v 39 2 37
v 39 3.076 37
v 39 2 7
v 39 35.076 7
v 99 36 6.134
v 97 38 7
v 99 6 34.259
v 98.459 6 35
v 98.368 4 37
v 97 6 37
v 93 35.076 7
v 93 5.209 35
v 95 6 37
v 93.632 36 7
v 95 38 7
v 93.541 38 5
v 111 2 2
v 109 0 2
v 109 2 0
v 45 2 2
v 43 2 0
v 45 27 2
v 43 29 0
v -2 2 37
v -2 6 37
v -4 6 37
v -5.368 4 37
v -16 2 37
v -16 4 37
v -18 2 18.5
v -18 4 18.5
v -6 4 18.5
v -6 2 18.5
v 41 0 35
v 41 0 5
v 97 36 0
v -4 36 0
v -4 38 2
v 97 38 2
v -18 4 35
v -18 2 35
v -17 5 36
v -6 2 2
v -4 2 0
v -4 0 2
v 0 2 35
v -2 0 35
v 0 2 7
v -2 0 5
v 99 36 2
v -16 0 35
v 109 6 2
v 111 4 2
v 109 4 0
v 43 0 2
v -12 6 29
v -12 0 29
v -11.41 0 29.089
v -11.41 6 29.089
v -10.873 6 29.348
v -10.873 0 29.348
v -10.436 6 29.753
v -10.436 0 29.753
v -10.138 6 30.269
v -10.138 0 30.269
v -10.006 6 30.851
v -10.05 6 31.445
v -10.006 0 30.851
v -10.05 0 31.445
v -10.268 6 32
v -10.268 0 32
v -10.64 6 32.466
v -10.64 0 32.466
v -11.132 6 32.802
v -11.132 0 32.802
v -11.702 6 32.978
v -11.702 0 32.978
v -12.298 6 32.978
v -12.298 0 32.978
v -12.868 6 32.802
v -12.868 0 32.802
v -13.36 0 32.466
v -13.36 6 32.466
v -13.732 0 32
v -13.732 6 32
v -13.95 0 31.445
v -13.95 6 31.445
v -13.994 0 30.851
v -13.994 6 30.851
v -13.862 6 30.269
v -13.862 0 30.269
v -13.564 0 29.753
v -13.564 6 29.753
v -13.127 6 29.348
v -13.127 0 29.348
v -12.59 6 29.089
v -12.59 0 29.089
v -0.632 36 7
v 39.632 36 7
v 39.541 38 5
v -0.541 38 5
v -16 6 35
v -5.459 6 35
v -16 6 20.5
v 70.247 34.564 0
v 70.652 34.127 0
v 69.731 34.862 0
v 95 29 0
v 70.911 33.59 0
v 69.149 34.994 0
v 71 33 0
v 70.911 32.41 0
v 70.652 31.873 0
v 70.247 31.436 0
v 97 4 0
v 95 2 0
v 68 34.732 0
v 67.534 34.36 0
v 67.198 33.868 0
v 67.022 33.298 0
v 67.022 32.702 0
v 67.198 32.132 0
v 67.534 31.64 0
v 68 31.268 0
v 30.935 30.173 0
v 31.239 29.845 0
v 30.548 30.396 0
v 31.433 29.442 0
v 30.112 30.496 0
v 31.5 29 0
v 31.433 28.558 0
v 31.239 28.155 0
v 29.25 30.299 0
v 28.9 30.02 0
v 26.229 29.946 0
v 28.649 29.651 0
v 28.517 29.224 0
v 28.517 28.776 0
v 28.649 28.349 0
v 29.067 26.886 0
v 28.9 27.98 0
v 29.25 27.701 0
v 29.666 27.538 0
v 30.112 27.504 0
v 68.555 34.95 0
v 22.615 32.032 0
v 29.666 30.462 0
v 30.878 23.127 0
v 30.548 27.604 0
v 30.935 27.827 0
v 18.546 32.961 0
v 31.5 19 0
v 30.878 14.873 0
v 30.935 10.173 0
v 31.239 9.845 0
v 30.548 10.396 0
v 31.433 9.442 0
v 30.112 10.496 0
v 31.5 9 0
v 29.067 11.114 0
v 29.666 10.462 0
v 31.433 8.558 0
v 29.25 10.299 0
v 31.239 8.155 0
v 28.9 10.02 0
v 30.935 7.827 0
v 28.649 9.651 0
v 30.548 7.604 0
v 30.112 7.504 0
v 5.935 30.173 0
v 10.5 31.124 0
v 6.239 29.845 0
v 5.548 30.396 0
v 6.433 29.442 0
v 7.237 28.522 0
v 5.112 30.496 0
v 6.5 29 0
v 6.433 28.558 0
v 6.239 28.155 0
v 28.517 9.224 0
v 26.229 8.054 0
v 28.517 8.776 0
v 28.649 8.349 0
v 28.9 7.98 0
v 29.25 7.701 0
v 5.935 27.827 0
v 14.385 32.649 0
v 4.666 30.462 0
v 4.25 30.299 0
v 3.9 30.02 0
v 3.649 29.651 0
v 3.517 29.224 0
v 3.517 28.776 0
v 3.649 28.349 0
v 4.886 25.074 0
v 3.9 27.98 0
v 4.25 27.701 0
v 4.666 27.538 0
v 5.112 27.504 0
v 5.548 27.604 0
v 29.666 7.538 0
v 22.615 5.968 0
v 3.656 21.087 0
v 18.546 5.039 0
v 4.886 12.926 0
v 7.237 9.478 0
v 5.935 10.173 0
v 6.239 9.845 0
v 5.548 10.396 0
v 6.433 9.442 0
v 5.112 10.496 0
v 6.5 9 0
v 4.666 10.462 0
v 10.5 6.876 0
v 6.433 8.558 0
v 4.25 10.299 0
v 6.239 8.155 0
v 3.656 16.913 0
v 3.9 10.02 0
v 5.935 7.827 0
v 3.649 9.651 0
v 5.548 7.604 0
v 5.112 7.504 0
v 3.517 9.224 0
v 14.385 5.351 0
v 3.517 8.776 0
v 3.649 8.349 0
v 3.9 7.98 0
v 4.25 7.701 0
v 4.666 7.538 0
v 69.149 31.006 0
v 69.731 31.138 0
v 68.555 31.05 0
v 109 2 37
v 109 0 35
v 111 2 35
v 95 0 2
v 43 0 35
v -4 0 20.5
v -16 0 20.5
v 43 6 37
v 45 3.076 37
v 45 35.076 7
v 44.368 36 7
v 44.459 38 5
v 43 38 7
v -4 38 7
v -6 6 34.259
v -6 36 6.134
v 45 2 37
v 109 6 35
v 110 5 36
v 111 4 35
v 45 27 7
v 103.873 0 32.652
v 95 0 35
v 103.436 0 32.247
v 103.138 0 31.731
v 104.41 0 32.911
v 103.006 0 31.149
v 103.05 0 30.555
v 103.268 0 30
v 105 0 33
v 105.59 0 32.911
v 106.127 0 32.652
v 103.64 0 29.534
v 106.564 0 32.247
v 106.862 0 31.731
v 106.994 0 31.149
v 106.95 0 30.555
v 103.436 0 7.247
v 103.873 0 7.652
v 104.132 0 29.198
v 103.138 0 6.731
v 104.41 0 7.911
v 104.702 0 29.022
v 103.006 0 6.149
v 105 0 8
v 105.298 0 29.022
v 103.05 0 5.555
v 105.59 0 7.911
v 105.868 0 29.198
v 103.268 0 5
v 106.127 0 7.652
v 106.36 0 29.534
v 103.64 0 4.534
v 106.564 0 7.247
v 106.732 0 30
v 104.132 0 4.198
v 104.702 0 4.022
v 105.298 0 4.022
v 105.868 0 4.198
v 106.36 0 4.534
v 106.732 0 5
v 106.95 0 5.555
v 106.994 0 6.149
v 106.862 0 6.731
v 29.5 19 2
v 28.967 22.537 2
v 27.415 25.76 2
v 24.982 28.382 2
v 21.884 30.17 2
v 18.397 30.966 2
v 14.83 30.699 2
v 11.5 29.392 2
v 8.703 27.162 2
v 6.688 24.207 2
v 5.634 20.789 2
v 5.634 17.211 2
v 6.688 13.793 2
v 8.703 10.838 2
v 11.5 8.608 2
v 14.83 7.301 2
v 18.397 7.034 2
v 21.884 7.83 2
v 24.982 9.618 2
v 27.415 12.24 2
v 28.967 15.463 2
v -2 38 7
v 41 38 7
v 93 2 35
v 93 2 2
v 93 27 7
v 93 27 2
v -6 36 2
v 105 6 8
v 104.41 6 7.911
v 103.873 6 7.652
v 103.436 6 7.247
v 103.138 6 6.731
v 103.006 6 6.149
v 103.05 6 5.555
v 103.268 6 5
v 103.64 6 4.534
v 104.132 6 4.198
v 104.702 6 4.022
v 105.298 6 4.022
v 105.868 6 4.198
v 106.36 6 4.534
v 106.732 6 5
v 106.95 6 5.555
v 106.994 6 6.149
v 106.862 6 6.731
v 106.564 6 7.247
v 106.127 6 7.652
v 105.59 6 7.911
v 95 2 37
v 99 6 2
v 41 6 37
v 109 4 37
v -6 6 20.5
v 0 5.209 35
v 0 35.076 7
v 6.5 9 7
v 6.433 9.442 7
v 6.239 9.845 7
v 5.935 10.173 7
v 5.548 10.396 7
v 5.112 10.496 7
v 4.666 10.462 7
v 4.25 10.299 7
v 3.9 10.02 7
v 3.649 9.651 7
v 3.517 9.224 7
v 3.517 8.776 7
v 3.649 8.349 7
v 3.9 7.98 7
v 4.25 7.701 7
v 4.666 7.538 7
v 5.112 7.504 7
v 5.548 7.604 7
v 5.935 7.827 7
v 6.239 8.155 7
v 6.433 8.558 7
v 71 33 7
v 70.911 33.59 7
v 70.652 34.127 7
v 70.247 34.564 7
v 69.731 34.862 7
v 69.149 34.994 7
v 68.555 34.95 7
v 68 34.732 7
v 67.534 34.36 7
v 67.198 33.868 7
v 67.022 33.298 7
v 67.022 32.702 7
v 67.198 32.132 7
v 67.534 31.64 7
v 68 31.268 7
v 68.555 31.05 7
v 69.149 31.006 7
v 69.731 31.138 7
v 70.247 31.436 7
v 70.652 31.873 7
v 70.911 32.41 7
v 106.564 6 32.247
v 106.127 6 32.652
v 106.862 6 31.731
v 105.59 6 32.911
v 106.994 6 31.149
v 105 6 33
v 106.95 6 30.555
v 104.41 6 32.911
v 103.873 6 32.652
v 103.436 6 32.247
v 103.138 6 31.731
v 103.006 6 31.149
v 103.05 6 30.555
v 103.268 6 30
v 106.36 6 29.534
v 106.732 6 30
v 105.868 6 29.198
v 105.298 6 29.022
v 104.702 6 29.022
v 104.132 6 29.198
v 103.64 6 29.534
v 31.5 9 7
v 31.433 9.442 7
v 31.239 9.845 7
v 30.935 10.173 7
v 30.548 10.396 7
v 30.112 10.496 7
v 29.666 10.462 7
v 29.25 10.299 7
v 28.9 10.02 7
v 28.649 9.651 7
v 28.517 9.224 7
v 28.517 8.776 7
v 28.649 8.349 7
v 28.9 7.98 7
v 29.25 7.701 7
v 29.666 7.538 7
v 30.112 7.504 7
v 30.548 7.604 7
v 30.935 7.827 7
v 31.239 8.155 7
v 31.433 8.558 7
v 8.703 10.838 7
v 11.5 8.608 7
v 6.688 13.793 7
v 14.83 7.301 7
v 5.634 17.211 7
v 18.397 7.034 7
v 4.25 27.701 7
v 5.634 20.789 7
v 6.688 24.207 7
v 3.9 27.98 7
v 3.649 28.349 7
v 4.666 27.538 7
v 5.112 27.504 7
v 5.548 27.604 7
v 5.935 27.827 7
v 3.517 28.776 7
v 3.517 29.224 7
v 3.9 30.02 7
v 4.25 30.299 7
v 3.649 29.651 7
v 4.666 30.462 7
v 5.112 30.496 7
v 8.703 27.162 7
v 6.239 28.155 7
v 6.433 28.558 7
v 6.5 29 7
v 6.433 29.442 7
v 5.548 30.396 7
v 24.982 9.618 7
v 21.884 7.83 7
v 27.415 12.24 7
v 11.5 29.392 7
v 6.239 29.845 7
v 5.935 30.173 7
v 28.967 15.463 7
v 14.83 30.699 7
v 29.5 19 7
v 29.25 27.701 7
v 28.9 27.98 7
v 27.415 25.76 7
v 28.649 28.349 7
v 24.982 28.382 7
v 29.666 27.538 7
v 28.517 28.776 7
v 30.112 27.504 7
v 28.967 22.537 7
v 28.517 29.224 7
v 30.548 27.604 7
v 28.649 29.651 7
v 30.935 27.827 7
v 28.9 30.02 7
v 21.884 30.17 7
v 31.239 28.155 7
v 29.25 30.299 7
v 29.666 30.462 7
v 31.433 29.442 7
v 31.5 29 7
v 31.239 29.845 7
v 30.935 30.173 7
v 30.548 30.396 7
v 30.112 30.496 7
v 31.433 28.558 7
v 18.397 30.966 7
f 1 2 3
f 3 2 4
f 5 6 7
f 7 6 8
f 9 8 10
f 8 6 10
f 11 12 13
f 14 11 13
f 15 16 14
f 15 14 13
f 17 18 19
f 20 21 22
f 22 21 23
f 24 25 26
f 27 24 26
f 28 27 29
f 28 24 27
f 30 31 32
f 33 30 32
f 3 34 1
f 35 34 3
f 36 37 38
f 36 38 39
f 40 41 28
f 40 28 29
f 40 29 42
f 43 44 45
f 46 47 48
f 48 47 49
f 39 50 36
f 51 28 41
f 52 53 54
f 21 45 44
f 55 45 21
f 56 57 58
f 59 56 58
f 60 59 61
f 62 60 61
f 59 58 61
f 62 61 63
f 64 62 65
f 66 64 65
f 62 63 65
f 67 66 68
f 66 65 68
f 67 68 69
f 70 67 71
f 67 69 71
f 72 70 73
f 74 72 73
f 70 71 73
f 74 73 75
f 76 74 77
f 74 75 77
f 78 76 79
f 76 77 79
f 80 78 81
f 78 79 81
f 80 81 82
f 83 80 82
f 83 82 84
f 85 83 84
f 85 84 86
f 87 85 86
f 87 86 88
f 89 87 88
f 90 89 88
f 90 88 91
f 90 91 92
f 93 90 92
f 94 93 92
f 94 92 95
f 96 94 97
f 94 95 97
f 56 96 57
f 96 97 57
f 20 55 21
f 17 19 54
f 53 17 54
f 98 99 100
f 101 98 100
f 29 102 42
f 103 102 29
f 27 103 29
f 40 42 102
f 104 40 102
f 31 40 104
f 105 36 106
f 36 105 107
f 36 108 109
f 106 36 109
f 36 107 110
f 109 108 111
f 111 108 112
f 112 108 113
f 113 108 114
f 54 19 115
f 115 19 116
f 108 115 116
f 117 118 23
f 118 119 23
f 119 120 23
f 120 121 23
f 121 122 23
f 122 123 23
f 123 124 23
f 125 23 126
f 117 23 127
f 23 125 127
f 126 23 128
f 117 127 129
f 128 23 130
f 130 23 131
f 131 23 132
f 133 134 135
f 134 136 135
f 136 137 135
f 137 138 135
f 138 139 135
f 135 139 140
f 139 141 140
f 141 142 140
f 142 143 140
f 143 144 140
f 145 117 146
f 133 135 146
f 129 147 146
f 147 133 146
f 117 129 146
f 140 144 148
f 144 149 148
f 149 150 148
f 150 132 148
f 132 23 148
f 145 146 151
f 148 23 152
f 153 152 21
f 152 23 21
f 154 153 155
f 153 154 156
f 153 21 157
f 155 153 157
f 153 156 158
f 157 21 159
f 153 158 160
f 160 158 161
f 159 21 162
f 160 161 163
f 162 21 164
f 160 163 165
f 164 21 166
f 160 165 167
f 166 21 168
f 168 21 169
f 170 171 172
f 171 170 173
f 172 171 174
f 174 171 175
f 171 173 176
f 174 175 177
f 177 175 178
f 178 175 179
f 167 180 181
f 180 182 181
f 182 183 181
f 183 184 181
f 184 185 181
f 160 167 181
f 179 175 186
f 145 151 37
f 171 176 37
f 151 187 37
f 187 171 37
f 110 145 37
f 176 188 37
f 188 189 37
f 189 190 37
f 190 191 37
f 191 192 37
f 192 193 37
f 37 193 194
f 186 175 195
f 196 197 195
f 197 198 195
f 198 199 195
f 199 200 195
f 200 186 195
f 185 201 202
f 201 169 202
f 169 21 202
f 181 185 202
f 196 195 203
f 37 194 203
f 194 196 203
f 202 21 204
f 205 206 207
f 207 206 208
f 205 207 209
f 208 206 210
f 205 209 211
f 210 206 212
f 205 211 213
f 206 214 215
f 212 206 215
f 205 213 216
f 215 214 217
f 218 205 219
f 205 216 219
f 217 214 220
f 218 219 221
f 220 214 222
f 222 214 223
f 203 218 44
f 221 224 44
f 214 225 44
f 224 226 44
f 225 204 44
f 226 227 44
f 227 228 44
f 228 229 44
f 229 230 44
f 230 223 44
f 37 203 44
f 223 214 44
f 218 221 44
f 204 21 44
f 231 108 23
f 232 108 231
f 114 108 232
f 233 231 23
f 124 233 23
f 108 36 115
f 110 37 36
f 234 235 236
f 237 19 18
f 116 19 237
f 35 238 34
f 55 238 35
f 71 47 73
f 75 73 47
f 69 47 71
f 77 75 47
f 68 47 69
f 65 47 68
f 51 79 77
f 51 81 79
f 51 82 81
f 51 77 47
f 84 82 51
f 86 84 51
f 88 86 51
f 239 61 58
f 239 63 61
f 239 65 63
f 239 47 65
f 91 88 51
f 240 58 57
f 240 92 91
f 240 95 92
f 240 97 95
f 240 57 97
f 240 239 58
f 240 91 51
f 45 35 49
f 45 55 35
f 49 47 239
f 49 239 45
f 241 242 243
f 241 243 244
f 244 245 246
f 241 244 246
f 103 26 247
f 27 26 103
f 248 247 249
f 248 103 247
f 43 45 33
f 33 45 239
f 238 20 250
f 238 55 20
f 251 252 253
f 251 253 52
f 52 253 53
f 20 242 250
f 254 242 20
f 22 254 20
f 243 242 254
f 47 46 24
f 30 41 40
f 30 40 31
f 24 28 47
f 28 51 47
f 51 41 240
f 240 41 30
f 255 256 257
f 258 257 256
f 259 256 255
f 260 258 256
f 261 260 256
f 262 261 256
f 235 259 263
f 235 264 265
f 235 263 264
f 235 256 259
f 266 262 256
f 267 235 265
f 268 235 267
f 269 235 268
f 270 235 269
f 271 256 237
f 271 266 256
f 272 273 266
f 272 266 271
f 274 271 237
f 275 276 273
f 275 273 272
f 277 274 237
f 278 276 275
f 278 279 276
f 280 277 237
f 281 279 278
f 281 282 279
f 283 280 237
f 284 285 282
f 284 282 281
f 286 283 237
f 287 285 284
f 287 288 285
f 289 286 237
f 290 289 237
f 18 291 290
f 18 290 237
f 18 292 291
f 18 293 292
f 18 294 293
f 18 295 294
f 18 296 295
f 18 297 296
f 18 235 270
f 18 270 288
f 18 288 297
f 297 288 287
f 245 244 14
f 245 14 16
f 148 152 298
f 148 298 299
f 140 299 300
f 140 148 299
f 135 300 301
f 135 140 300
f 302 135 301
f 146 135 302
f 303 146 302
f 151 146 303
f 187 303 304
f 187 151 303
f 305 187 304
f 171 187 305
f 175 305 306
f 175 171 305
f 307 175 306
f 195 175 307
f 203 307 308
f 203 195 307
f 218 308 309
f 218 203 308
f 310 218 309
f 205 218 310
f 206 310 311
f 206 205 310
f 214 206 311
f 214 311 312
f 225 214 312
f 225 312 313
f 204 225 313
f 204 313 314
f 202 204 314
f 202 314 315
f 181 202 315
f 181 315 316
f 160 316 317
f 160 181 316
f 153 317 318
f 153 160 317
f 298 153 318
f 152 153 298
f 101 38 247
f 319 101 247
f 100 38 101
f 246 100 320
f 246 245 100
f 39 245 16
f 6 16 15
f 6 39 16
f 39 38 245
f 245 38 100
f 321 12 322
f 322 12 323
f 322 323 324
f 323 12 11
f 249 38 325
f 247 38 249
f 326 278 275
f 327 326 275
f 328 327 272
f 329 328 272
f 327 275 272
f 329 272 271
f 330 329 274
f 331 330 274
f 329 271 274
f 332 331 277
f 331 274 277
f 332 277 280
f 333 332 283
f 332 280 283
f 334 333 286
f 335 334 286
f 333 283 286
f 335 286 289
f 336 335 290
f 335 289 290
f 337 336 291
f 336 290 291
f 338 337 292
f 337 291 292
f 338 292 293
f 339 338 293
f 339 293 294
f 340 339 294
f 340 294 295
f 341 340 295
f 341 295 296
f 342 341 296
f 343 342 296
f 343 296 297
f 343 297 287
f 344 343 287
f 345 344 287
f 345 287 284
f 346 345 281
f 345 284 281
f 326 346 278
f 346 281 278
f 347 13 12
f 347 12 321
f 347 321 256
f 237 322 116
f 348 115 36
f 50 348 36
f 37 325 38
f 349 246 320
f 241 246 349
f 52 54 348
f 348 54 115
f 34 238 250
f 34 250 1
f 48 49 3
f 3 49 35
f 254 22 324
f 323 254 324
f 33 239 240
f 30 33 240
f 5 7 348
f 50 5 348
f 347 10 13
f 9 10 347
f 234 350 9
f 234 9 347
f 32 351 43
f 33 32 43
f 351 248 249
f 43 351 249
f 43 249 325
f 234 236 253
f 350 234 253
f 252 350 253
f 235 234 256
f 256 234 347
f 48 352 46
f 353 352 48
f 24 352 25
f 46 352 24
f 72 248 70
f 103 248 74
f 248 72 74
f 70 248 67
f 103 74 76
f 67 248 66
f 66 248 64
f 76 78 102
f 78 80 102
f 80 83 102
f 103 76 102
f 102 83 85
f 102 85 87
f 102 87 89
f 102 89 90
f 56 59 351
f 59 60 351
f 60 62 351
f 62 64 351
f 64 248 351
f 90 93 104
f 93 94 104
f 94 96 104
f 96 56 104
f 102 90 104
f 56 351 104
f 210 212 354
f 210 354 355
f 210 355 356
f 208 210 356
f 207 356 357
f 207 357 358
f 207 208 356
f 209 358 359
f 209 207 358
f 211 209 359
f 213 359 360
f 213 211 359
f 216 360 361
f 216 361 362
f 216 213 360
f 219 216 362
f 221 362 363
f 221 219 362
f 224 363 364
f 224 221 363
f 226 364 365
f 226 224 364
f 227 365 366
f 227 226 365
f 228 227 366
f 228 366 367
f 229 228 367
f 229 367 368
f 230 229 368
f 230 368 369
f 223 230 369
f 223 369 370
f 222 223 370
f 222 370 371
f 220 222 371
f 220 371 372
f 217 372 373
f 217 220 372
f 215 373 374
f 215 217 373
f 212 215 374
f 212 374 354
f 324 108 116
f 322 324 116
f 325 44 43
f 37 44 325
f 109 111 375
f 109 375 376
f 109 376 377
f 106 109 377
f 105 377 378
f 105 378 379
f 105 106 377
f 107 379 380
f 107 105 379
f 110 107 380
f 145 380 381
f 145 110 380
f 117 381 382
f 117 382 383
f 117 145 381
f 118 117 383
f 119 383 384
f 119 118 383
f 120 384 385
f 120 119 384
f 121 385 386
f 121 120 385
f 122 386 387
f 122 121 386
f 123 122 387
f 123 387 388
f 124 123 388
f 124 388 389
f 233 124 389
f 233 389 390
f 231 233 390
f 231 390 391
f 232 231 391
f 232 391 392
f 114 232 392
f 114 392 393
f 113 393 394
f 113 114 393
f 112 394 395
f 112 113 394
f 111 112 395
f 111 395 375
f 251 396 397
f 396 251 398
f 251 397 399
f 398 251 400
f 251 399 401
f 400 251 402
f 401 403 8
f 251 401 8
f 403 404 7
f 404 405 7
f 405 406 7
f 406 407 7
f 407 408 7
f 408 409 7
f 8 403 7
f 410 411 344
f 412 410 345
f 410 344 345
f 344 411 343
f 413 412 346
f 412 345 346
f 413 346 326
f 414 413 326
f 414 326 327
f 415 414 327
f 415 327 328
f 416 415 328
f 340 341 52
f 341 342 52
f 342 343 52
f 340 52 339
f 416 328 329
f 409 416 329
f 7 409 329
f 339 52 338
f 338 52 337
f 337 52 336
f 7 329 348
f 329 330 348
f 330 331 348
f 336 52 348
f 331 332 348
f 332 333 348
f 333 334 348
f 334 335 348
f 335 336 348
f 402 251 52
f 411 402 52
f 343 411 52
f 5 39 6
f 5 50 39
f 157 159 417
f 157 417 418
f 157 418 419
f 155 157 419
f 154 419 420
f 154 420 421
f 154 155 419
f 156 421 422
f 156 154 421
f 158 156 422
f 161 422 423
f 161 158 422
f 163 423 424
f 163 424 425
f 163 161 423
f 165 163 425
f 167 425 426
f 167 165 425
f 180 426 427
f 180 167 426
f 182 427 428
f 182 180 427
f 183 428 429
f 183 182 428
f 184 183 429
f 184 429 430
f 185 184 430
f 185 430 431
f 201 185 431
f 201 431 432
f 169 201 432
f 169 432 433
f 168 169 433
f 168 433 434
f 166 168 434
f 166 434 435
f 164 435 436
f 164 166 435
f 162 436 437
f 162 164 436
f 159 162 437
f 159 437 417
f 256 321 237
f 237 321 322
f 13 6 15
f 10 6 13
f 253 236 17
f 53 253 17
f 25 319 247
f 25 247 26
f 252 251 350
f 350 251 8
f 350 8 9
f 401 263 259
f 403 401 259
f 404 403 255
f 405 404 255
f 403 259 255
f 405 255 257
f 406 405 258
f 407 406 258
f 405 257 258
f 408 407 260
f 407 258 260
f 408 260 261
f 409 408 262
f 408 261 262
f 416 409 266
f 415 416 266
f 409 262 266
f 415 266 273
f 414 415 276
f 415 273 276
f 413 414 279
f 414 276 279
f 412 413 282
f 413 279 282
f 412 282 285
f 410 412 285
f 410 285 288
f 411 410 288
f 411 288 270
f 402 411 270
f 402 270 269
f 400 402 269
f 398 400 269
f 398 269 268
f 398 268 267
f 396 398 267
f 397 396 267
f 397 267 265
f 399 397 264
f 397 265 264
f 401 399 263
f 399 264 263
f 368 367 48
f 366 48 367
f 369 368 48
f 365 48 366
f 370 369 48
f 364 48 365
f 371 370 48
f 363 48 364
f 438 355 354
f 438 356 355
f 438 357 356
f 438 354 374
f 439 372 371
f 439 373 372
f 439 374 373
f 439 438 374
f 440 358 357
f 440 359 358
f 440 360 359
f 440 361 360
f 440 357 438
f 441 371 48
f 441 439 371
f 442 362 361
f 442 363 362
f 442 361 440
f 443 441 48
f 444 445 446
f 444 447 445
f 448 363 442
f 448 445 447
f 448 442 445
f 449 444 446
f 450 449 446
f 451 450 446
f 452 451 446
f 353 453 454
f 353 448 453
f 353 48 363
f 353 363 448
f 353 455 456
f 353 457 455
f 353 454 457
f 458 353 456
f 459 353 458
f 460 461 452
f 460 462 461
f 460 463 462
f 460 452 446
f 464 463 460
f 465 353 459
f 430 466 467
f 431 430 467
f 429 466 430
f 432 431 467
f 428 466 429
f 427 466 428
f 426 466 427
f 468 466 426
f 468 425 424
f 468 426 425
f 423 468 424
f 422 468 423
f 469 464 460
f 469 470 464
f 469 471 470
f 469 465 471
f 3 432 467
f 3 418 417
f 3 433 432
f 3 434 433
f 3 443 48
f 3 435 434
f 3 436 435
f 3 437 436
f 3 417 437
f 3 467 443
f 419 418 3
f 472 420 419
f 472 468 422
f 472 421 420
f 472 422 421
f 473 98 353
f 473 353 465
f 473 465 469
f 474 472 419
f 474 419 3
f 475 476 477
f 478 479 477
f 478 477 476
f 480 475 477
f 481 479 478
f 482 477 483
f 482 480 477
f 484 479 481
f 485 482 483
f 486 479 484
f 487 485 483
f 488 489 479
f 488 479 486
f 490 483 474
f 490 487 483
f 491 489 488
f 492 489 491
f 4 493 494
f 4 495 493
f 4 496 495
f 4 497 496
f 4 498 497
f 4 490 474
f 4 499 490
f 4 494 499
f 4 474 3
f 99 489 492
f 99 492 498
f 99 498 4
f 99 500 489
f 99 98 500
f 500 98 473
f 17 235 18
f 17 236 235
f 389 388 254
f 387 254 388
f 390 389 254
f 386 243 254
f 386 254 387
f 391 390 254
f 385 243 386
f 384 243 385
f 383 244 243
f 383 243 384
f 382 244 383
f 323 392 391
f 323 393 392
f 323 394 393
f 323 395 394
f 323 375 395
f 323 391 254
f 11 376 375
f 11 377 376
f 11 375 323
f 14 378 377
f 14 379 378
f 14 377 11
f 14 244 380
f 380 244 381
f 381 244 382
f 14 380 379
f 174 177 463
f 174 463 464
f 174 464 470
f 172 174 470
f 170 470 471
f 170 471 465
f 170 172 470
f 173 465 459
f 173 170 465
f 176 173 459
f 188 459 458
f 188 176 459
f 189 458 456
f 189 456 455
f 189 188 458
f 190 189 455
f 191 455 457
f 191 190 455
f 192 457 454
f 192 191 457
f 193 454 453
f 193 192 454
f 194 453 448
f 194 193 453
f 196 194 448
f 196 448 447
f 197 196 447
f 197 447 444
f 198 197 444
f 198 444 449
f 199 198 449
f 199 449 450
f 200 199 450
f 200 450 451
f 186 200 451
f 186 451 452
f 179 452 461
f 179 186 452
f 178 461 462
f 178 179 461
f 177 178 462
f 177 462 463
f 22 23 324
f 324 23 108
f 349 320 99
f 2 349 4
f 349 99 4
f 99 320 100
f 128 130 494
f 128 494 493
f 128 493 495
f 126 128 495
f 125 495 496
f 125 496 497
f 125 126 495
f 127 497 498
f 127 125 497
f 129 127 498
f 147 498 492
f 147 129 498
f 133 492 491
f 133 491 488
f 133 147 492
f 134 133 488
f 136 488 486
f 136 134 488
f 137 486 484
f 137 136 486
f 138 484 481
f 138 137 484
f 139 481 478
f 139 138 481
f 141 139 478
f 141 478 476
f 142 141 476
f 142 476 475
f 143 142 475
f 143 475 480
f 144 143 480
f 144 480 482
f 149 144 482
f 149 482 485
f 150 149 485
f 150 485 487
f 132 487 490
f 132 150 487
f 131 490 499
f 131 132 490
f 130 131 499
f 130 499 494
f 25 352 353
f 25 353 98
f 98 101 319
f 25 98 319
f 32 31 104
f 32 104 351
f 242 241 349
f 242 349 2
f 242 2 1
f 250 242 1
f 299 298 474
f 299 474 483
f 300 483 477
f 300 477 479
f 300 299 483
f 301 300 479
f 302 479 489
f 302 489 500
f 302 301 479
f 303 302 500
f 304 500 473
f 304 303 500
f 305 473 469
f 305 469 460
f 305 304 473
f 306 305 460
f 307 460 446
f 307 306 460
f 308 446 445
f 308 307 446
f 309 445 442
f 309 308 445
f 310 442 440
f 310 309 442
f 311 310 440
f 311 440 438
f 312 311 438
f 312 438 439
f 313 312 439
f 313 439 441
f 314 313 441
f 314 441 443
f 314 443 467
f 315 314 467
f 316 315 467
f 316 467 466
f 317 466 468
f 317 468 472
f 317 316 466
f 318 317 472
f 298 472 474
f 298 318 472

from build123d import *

# Parameters (mm, degrees)
SKETCH1_R           = 12
SKETCH1_R_2         = 1.5
SKETCH1_R_3         = 2
BOSS_EXTRUDE1_DEPTH = 7
BOSS_EXTRUDE2_DEPTH = 6
BOSS_EXTRUDE3_START = -99
BOSS_EXTRUDE3_DEPTH = 6
BOSS_EXTRUDE4_START = -54
BOSS_EXTRUDE4_DEPTH = 6
SKETCH3_W           = 12
SKETCH3_H           = 37
SKETCH3_R           = 2
BOSS_EXTRUDE5_DEPTH = 6
SKETCH4_W           = 12
SKETCH4_H           = 18.5
CUT_EXTRUDE1_DEPTH  = 10
CHAMFER1_SIZE       = 2
CHAMFER2_SIZE       = 2


with BuildPart() as part:
    # Sketch1 → Boss-Extrude1 (new body)
    with BuildSketch(Plane.XY):
        Polygon((0, 0), (45, 0), (45, 27), (93, 27), (93, 0), (99, 0), (99, 38), (0, 38), align=None)
        with Locations((17.5, 19)):
            Circle(SKETCH1_R, mode=Mode.SUBTRACT)
        with Locations((5, 29)):
            Circle(SKETCH1_R_2, mode=Mode.SUBTRACT)
        with Locations((5, 9)):
            Circle(SKETCH1_R_2, mode=Mode.SUBTRACT)
        with Locations((30, 9)):
            Circle(SKETCH1_R_2, mode=Mode.SUBTRACT)
        with Locations((30, 29)):
            Circle(SKETCH1_R_2, mode=Mode.SUBTRACT)
        with Locations((69, 33)):
            Circle(SKETCH1_R_3, mode=Mode.SUBTRACT)
    extrude(amount=BOSS_EXTRUDE1_DEPTH)

    # Sketch2 → Boss-Extrude2 (add)
    with BuildSketch(Plane(origin=(99, 0, 0), x_dir=(0, 0, -1), z_dir=(1, 0, 0))):
        Polygon((-37, 0), (-7, 0), (0, 0), (0, 38), (-7, 38), (-37, 6), align=None)
    extrude(amount=-BOSS_EXTRUDE2_DEPTH)

    # Sketch2<3> → Boss-Extrude3 (add)
    with BuildSketch(Plane(origin=(99, 0, 0), x_dir=(0, 0, -1), z_dir=(1, 0, 0)).offset(BOSS_EXTRUDE3_START)):
        Polygon((-37, 0), (-7, 0), (0, 0), (0, 38), (-7, 38), (-37, 6), align=None)
    extrude(amount=-BOSS_EXTRUDE3_DEPTH)

    # Sketch2<4> → Boss-Extrude4 (add)
    with BuildSketch(Plane(origin=(99, 0, 0), x_dir=(0, 0, -1), z_dir=(1, 0, 0)).offset(BOSS_EXTRUDE4_START)):
        Polygon((-37, 0), (-7, 0), (0, 0), (0, 38), (-7, 38), (-37, 6), align=None)
    extrude(amount=-BOSS_EXTRUDE4_DEPTH)

    # Sketch3 → Boss-Extrude5 (add)
    # profile 1 of 2: a face of its own
    with BuildSketch(Plane(origin=(0, 0, 0), x_dir=(-1, 0, 0), z_dir=(0, -1, 0))):
        with Locations((12, -18.5)):
            Rectangle(SKETCH3_W, SKETCH3_H)
        with Locations(Location((12, -31, 0), (0, 0, 90))):
            Circle(SKETCH3_R, mode=Mode.SUBTRACT)
        with Locations(Location((12, -6, 0), (0, 0, 90))):
            Circle(SKETCH3_R, mode=Mode.SUBTRACT)
    # profile 2 of 2: a face of its own
    with BuildSketch(Plane(origin=(0, 0, 0), x_dir=(-1, 0, 0), z_dir=(0, -1, 0))):
        with Locations((-105, -18.5)):
            Rectangle(SKETCH3_W, SKETCH3_H)
        with Locations(Location((-105, -31, 0), (0, 0, 270))):
            Circle(SKETCH3_R, mode=Mode.SUBTRACT)
        with Locations(Location((-105, -6, 0), (0, 0, 270))):
            Circle(SKETCH3_R, mode=Mode.SUBTRACT)
    extrude(amount=-BOSS_EXTRUDE5_DEPTH)

    # Sketch4 → Cut-Extrude1 (cut)
    with BuildSketch(Plane(origin=(0, 6, 0), x_dir=(1, 0, 0), z_dir=(0, 1, 0))):
        with Locations((-12, -9.25)):
            Rectangle(SKETCH4_W, SKETCH4_H)
    extrude(amount=-CUT_EXTRUDE1_DEPTH, mode=Mode.SUBTRACT)

    # Chamfer1
    chamfer1_edges = [part.edges().sort_by_distance(p)[0] for p in [
        (5.5, 19, 0),
        (69, 38, 7),
        (19.5, 38, 7),
        (111, 0, 18.5),
        (111, 6, 18.5),
        (19.5, 0, 7),
        (0, 0, 22),
        (93, 0, 18.5),
        (93, 3, 37),
        (102, 0, 37),
        (0, 3, 37),
        (39, 0, 22),
        (42, 0, 37),
        (45, 0, 18.5),
        (-9, 0, 37),
        (-18, 3, 37),
        (-18, 0, 27.75),
        (-18, 6, 27.75),
        (19.5, 0, 0),
        (45, 13.5, 0),
        (69, 27, 0),
        (93, 13.5, 0),
        (102, 0, 0),
        (111, 3, 37),
        (111, 3, 0),
        (105, 6, 0),
        (99, 22, 22),
        (99, 38, 3.5),
        (-6, 22, 22),
        (-6, 38, 3.5),
        (-6, 19, 0),
        (99, 22, 0),
        (46.5, 38, 0),
        (-12, 0, 18.5),
        (-12, 6, 18.5),
        (-6, 0, 9.25),
    ]]
    chamfer(chamfer1_edges, length=CHAMFER1_SIZE)

    # Chamfer2
    # the kernel refuses this chamfer: 2 mm, written as the material it takes off along each edge
    with BuildSketch(Plane(origin=(97, 6, 37), x_dir=(0, 0.027495876610588235, -0.9996219169112968), z_dir=(1, 0, 0))) as chamfer2_piece_1_section:
        Polygon((CHAMFER2_SIZE * 0.999621916911, -CHAMFER2_SIZE * 0.0274958766106), (-CHAMFER2_SIZE * 0.0274958766106, -CHAMFER2_SIZE * 0.999621916911), (0, 0), align=None)
    chamfer2_piece_1 = extrude(amount=17.143365976, mode=Mode.PRIVATE)
    chamfer2_piece_1 = split(chamfer2_piece_1, bisect_by=Plane(origin=(100.7856843, 3.388099041, 34.25949849), z_dir=(0.7071067811865475, 0.4836194101643707, 0.5158607041753291)), keep=Keep.TOP, mode=Mode.PRIVATE)
    add(chamfer2_piece_1, mode=Mode.SUBTRACT)
    with BuildSketch(Plane(origin=(-4, 6, 37), x_dir=(-1.1675093231223383e-15, 0.027495876610589956, -0.9996219169112965), z_dir=(-1, 0, 0))) as chamfer2_piece_2_section:
        Polygon((CHAMFER2_SIZE * 0.999621916911, CHAMFER2_SIZE * 0.0274958766106), (-CHAMFER2_SIZE * 0.0274958766106, CHAMFER2_SIZE * 0.999621916911), (0, 0), align=None)
    chamfer2_piece_2 = extrude(amount=17.143365976, mode=Mode.PRIVATE)
    chamfer2_piece_2 = split(chamfer2_piece_2, bisect_by=Plane(origin=(-7.7856843, 3.388099041, 34.25949849), z_dir=(-0.7071067811865475, 0.4836194101643707, 0.5158607041753291)), keep=Keep.TOP, mode=Mode.PRIVATE)
    add(chamfer2_piece_2, mode=Mode.SUBTRACT)
    with BuildSketch(Plane(origin=(0, 41.752276834, 3.482240468), x_dir=(0.027495876610586428, -0.6836825423068311, -0.72926137846062), z_dir=(0, -0.7295372041400852, 0.6839411288813297))) as chamfer2_piece_3_section:
        Polygon((CHAMFER2_SIZE * 0.999621916911, -CHAMFER2_SIZE * 0.0274958766106), (-CHAMFER2_SIZE * 0.0274958766106, -CHAMFER2_SIZE * 0.999621916911), (0, 0), align=None)
    chamfer2_piece_3 = extrude(amount=51.225928058, mode=Mode.PRIVATE)
    chamfer2_piece_3 = split(chamfer2_piece_3, bisect_by=Plane(origin=(-0.581475565, 36.992815088, 6.007184912), z_dir=(0, 0.7071067811865476, 0.7071067811865476)), keep=Keep.TOP, mode=Mode.PRIVATE)
    add(chamfer2_piece_3, mode=Mode.SUBTRACT)
    with BuildSketch(Plane(origin=(0, 41.752276834, 3.482240468), x_dir=(0.027495876610586428, -0.6836825423068311, -0.72926137846062), z_dir=(0, -0.7295372041400852, 0.6839411288813297))) as chamfer2_piece_4_section:
        Polygon((CHAMFER2_SIZE * 0.999621916911, -CHAMFER2_SIZE * 0.0274958766106), (-CHAMFER2_SIZE * 0.0274958766106, -CHAMFER2_SIZE * 0.999621916911), (0, 0), align=None)
    chamfer2_piece_4 = extrude(amount=51.225928058, mode=Mode.PRIVATE)
    chamfer2_piece_4 = split(chamfer2_piece_4, bisect_by=Plane(origin=(-0.512278585, 16.479410692, 7), z_dir=(0, 0, 1)), keep=Keep.TOP, mode=Mode.PRIVATE)
    add(chamfer2_piece_4, mode=Mode.SUBTRACT)
    with BuildSketch(Plane(origin=(93, 41.752276834, 3.482240468), x_dir=(-0.027495876610589116, -0.683682542306831, -0.7292613784606198), z_dir=(0, -0.7295372041400852, 0.6839411288813297))) as chamfer2_piece_5_section:
        Polygon((CHAMFER2_SIZE * 0.999621916911, CHAMFER2_SIZE * 0.0274958766106), (-CHAMFER2_SIZE * 0.0274958766106, CHAMFER2_SIZE * 0.999621916911), (0, 0), align=None)
    chamfer2_piece_5 = extrude(amount=51.225928058, mode=Mode.PRIVATE)
    chamfer2_piece_5 = split(chamfer2_piece_5, bisect_by=Plane(origin=(93.581475565, 36.992815088, 6.007184912), z_dir=(0, 0.7071067811865476, 0.7071067811865476)), keep=Keep.TOP, mode=Mode.PRIVATE)
    add(chamfer2_piece_5, mode=Mode.SUBTRACT)
    with BuildSketch(Plane(origin=(93, 41.752276834, 3.482240468), x_dir=(-0.027495876610589116, -0.683682542306831, -0.7292613784606198), z_dir=(0, -0.7295372041400852, 0.6839411288813297))) as chamfer2_piece_6_section:
        Polygon((CHAMFER2_SIZE * 0.999621916911, CHAMFER2_SIZE * 0.0274958766106), (-CHAMFER2_SIZE * 0.0274958766106, CHAMFER2_SIZE * 0.999621916911), (0, 0), align=None)
    chamfer2_piece_6 = extrude(amount=51.225928058, mode=Mode.PRIVATE)
    chamfer2_piece_6 = split(chamfer2_piece_6, bisect_by=Plane(origin=(93.512278585, 16.479410692, 7), z_dir=(0, 0, 1)), keep=Keep.TOP, mode=Mode.PRIVATE)
    add(chamfer2_piece_6, mode=Mode.SUBTRACT)
    with BuildSketch(Plane(origin=(39, 41.752276834, 3.482240468), x_dir=(0.9996219169112968, 0.01880556088862619, 0.020059264947867937), z_dir=(0, -0.7295372041400852, 0.6839411288813297))) as chamfer2_piece_7_section:
        Polygon((CHAMFER2_SIZE * 0.999621916911, -CHAMFER2_SIZE * 0.0274958766106), (-CHAMFER2_SIZE * 0.0274958766106, -CHAMFER2_SIZE * 0.999621916911), (0, 0), align=None)
    chamfer2_piece_7 = extrude(amount=54.150156351, mode=Mode.PRIVATE)
    chamfer2_piece_7 = split(chamfer2_piece_7, bisect_by=Plane(origin=(39.581475565, 36.992815088, 6.007184912), z_dir=(0, 0.7071067811865476, 0.7071067811865476)), keep=Keep.TOP, mode=Mode.PRIVATE)
    add(chamfer2_piece_7, mode=Mode.SUBTRACT)
    with BuildSketch(Plane(origin=(39, 41.752276834, 3.482240468), x_dir=(0.9996219169112968, 0.01880556088862619, 0.020059264947867937), z_dir=(0, -0.7295372041400852, 0.6839411288813297))) as chamfer2_piece_8_section:
        Polygon((CHAMFER2_SIZE * 0.999621916911, -CHAMFER2_SIZE * 0.0274958766106), (-CHAMFER2_SIZE * 0.0274958766106, -CHAMFER2_SIZE * 0.999621916911), (0, 0), align=None)
    chamfer2_piece_8 = extrude(amount=54.150156351, mode=Mode.PRIVATE)
    chamfer2_piece_8 = split(chamfer2_piece_8, bisect_by=Plane(origin=(39.51114873, 15.48496609, 7), z_dir=(0, 0, 1)), keep=Keep.TOP, mode=Mode.PRIVATE)
    add(chamfer2_piece_8, mode=Mode.SUBTRACT)
    with BuildSketch(Plane(origin=(45, 41.752276834, 3.482240468), x_dir=(0.027495876610585664, -0.6836825423068311, -0.7292613784606199), z_dir=(0, -0.7295372041400852, 0.6839411288813297))) as chamfer2_piece_9_section:
        Polygon((CHAMFER2_SIZE * 0.999621916911, -CHAMFER2_SIZE * 0.0274958766106), (-CHAMFER2_SIZE * 0.0274958766106, -CHAMFER2_SIZE * 0.999621916911), (0, 0), align=None)
    chamfer2_piece_9 = extrude(amount=54.150156351, mode=Mode.PRIVATE)
    chamfer2_piece_9 = split(chamfer2_piece_9, bisect_by=Plane(origin=(44.418524435, 36.992815088, 6.007184912), z_dir=(0, 0.7071067811865476, 0.7071067811865476)), keep=Keep.TOP, mode=Mode.PRIVATE)
    add(chamfer2_piece_9, mode=Mode.SUBTRACT)
    with BuildSketch(Plane(origin=(45, 41.752276834, 3.482240468), x_dir=(0.027495876610585664, -0.6836825423068311, -0.7292613784606199), z_dir=(0, -0.7295372041400852, 0.6839411288813297))) as chamfer2_piece_10_section:
        Polygon((CHAMFER2_SIZE * 0.999621916911, -CHAMFER2_SIZE * 0.0274958766106), (-CHAMFER2_SIZE * 0.0274958766106, -CHAMFER2_SIZE * 0.999621916911), (0, 0), align=None)
    chamfer2_piece_10 = extrude(amount=54.150156351, mode=Mode.PRIVATE)
    chamfer2_piece_10 = split(chamfer2_piece_10, bisect_by=Plane(origin=(44.48885127, 15.48496609, 7), z_dir=(0, 0, 1)), keep=Keep.TOP, mode=Mode.PRIVATE)
    add(chamfer2_piece_10, mode=Mode.SUBTRACT)


solid = part.part
